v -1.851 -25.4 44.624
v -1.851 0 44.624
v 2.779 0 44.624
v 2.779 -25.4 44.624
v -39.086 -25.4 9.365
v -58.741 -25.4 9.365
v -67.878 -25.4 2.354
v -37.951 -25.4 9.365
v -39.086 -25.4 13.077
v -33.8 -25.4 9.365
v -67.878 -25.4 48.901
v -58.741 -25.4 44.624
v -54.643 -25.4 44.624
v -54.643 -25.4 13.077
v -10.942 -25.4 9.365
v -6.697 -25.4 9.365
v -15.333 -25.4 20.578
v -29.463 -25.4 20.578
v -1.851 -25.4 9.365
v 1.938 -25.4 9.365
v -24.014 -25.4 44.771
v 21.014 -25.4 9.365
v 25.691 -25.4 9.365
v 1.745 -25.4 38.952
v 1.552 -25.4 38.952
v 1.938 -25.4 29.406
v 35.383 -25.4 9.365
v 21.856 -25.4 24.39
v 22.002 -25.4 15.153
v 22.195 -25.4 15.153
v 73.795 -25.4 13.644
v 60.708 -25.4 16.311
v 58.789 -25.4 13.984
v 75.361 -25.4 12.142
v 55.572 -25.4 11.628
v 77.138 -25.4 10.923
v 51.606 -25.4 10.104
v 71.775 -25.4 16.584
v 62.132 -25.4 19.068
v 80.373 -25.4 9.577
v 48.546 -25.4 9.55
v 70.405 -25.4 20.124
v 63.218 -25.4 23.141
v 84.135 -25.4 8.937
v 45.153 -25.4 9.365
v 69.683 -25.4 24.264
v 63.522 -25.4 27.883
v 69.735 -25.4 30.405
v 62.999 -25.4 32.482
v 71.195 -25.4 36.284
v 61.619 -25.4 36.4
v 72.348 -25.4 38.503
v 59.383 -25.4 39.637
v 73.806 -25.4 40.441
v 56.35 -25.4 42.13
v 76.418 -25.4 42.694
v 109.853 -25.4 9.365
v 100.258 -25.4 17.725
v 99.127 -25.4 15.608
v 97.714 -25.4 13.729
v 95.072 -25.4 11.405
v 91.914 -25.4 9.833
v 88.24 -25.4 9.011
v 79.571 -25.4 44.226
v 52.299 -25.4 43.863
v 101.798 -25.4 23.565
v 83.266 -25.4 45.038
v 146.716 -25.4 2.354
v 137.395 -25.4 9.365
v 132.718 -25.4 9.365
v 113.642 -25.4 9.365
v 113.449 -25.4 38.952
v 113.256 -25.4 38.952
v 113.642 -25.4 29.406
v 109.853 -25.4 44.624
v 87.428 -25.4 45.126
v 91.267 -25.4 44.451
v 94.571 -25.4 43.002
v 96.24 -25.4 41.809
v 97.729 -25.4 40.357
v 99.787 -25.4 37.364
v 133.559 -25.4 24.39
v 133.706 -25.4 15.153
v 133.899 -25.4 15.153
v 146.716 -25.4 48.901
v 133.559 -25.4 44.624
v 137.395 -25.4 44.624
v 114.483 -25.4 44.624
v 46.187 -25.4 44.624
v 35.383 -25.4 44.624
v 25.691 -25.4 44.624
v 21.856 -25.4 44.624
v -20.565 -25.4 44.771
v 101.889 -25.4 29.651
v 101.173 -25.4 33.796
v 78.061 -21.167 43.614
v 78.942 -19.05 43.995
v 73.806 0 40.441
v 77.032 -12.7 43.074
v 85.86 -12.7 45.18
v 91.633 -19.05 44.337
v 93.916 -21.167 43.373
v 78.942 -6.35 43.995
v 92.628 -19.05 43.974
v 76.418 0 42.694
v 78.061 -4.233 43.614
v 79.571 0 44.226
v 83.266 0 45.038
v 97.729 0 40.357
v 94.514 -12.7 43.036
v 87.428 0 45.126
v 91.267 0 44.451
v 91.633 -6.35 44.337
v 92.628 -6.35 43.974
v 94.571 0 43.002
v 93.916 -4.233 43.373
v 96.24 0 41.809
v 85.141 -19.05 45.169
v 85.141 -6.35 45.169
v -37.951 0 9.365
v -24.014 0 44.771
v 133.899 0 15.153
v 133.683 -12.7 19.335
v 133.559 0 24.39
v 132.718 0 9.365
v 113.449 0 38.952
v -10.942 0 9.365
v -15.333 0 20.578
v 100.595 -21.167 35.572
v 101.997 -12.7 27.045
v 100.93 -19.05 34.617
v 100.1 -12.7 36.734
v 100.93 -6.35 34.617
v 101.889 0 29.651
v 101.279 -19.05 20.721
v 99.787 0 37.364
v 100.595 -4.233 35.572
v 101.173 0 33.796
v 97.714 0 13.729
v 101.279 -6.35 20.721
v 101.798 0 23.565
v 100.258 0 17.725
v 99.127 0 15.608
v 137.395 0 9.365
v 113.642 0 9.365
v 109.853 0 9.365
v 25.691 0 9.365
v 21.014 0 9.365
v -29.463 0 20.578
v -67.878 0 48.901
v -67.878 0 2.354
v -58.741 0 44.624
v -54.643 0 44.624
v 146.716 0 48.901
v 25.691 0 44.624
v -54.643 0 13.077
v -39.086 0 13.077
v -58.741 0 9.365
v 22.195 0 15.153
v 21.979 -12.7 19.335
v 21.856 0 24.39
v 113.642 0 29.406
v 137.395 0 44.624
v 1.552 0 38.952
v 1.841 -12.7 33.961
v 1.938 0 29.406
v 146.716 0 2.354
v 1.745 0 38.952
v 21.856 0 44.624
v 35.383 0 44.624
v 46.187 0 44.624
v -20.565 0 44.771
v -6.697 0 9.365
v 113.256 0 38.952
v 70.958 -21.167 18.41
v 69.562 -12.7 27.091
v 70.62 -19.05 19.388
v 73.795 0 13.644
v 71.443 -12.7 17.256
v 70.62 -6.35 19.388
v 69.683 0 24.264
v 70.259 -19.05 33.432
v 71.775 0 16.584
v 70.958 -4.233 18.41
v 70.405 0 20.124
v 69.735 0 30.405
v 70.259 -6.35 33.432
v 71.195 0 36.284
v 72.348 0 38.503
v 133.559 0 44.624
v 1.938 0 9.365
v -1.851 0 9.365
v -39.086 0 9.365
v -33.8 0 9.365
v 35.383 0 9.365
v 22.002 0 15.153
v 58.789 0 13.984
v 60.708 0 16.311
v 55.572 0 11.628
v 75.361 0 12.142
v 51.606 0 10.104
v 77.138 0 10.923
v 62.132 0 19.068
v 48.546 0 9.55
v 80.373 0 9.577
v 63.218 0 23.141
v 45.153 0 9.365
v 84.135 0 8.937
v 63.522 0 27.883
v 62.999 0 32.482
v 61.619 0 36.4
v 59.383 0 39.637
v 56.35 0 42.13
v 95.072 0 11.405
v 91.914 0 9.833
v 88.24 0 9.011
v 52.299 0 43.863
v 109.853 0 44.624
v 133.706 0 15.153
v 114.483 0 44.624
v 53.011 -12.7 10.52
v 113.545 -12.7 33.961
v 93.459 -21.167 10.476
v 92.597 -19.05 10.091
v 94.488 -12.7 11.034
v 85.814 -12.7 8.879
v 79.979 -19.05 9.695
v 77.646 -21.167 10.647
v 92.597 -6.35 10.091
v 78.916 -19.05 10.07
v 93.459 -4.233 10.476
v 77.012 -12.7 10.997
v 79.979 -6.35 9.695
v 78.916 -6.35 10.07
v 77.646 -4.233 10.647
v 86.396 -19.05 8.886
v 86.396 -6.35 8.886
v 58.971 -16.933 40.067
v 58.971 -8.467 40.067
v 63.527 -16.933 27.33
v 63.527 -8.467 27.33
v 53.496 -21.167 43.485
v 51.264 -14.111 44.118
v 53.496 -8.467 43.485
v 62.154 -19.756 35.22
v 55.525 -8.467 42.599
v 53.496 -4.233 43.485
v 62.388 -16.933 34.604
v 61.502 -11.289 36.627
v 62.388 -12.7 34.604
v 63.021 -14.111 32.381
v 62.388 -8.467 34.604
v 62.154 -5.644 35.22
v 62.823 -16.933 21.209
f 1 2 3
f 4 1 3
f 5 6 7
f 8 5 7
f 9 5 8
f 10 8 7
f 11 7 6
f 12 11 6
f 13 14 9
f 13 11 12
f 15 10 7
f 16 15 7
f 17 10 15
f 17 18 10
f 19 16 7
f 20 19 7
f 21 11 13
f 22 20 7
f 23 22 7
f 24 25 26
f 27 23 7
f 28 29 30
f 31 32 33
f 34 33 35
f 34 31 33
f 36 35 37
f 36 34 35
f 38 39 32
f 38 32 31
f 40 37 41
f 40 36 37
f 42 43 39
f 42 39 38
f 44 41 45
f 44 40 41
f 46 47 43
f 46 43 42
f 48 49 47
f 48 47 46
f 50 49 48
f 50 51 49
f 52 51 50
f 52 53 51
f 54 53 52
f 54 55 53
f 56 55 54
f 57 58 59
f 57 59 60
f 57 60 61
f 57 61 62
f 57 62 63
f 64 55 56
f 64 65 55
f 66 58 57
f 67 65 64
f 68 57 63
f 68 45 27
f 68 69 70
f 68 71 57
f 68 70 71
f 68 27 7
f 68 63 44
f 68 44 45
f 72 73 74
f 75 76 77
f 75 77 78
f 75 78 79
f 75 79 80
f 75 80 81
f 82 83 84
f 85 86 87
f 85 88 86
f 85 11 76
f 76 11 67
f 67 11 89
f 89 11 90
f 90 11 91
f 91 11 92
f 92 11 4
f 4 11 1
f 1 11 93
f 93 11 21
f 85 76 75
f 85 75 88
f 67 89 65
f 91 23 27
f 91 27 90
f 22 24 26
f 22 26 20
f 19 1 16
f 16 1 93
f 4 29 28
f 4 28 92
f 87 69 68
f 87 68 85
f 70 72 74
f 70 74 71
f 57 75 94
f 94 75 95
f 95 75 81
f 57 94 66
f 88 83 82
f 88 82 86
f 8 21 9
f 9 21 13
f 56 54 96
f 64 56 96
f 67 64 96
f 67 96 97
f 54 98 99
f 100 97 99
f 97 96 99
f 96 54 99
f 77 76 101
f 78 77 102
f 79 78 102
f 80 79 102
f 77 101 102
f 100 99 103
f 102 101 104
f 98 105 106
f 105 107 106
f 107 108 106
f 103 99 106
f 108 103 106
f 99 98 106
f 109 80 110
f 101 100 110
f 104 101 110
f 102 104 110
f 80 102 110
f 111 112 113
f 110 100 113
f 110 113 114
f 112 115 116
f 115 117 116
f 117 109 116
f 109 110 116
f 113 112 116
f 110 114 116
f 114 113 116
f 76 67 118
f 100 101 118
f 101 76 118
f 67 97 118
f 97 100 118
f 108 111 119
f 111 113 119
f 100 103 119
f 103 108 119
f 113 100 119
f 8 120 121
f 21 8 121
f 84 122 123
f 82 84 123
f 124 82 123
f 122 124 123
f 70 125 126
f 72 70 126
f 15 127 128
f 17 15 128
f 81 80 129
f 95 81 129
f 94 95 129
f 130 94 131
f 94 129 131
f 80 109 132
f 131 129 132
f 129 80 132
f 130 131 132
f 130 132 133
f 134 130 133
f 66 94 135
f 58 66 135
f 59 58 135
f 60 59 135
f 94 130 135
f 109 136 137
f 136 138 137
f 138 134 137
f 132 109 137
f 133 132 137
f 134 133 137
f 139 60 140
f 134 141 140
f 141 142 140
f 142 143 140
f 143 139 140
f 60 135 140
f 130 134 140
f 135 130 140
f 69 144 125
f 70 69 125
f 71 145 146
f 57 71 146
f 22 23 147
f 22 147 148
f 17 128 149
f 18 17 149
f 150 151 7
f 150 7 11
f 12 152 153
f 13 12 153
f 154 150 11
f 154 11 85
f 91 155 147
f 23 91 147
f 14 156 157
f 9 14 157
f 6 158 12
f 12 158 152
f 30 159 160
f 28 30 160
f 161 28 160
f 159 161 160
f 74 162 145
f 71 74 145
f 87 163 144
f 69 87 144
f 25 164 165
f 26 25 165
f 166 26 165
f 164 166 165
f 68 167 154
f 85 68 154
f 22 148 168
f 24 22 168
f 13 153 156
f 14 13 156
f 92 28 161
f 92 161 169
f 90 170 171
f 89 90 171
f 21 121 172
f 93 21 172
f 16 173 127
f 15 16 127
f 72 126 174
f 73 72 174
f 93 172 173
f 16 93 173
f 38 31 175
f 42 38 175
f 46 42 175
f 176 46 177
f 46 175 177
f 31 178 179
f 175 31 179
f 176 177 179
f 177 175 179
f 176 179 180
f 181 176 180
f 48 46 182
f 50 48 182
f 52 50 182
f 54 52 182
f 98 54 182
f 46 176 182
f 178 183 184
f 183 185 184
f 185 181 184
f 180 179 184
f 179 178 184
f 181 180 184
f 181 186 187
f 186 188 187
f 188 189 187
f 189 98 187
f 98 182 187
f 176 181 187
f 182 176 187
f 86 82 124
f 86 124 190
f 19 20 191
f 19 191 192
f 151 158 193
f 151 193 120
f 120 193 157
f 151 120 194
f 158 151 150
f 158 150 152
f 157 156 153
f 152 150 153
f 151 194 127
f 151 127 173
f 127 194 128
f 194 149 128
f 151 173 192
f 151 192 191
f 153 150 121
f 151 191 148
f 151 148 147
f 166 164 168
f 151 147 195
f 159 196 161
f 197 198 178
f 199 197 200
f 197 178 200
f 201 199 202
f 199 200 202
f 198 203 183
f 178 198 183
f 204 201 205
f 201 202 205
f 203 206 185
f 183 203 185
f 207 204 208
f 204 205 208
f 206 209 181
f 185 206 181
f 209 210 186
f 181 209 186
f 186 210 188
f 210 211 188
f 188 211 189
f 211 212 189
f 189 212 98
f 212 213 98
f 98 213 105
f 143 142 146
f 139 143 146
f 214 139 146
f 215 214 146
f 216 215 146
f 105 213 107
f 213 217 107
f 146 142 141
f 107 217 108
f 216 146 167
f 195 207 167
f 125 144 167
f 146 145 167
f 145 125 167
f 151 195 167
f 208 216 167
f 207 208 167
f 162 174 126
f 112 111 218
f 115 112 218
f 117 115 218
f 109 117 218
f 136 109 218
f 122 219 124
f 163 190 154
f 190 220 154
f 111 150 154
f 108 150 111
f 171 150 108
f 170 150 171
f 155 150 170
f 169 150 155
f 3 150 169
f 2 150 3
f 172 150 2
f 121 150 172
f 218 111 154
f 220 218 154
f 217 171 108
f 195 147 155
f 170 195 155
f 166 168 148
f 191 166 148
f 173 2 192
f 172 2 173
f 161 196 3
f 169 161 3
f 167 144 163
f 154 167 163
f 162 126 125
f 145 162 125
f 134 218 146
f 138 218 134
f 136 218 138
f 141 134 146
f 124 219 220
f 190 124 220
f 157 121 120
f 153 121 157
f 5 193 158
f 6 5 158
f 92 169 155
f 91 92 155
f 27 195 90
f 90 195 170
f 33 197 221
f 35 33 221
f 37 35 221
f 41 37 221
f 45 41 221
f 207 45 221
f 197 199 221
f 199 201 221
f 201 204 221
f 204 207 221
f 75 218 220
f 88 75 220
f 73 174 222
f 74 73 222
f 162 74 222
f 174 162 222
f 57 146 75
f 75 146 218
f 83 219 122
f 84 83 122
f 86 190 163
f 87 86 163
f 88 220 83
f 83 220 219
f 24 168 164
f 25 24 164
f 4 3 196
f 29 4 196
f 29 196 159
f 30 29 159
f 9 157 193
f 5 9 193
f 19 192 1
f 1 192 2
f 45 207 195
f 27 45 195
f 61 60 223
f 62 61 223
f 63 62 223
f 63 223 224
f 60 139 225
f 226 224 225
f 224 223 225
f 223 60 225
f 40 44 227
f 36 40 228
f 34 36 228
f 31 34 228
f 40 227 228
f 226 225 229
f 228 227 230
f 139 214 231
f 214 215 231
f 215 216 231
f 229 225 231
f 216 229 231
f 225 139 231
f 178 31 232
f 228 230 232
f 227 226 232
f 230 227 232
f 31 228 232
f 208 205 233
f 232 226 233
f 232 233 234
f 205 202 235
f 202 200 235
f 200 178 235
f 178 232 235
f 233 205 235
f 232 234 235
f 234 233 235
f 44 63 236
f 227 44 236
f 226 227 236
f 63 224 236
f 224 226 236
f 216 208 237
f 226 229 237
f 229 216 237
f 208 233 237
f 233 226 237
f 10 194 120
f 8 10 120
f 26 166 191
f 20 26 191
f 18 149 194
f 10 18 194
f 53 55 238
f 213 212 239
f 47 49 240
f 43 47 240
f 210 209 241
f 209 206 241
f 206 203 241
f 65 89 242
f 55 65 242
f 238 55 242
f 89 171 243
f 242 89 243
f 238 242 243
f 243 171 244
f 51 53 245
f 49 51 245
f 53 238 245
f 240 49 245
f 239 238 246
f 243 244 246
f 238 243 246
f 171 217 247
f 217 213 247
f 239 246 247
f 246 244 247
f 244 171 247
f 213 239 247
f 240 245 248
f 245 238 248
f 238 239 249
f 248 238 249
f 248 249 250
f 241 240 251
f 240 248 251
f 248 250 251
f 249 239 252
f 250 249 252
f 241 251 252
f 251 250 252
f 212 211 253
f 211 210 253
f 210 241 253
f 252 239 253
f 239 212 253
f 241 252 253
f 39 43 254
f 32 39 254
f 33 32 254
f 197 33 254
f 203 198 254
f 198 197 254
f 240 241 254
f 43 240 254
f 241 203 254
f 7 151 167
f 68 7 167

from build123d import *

# Parameters (mm, degrees)
F0_W     = 214.5938575268
F0_H     = 46.5465178713
F1_DEPTH = 25.4


with BuildPart() as f1:
    # F0 (on Front) → F1 (new body)
    with BuildSketch(Plane.XZ):
        with Locations((39.4191890955, 25.6276843138)):
            Rectangle(F0_W, F0_H)
        Polygon((-39.0857293959, 9.3650380149), (-58.7409636363, 9.3650380149), (-58.7409636363, 44.6240742319), (-54.6432292894, 44.6240742319), (-54.6432292894, 13.0769216701), (-39.0857293959, 13.0769216701), align=None, mode=Mode.SUBTRACT)
        Polygon((-6.697422326, 9.3650380149), (-10.9417799358, 9.3650380149), (-15.3327608085, 20.5778591187), (-29.4626131423, 20.5778591187), (-33.7995749182, 9.3650380149), (-37.951328362, 9.3650380149), (-24.0144013741, 44.7706974947), (-20.5648961894, 44.7706974947), align=None, mode=Mode.SUBTRACT)
        with BuildLine():
            Line((25.6908847439, 44.6240742319), (25.6908847439, 9.3650380149))
            Line((25.6908847439, 9.3650380149), (21.0143743593, 9.3650380149))
            Line((21.0143743593, 9.3650380149), (1.7449908106, 38.9520690624))
            Line((1.7449908106, 38.9520690624), (1.5520654647, 38.9520690624))
            add(Edge.make_bspline(
                [(1.5520654647, 38.9520690624), (1.9379161565, 33.743084723), (1.9379161565, 29.4061229472)],
                knots=[0, 0, 0, 1, 1, 1], degree=2))
            Line((1.9379161565, 29.4061229472), (1.9379161565, 9.3650380149))
            Line((1.9379161565, 9.3650380149), (-1.851137637, 9.3650380149))
            Line((-1.851137637, 9.3650380149), (-1.851137637, 44.6240742319))
            Line((-1.851137637, 44.6240742319), (2.7790706647, 44.6240742319))
            Line((2.7790706647, 44.6240742319), (22.0021521303, 15.152798392))
            Line((22.0021521303, 15.152798392), (22.1950774762, 15.152798392))
            add(Edge.make_bspline(
                [(22.1950774762, 15.152798392), (22.1487753932, 15.8010275542), (21.9790010888, 19.3354198911)],
                knots=[0, 0, 0, 1, 1, 1], degree=2))
            add(Edge.make_bspline(
                [(21.9790010888, 19.3354198911), (21.8092267844, 22.869812228), (21.8555288674, 24.3900639537)],
                knots=[0, 0, 0, 1, 1, 1], degree=2))
            Line((21.8555288674, 24.3900639537), (21.8555288674, 44.6240742319))
            Line((21.8555288674, 44.6240742319), (25.6908847439, 44.6240742319))
        make_face(mode=Mode.SUBTRACT)
        with BuildLine():
            add(Edge.make_bspline(
                [(58.9705069119, 40.0671775617), (63.5274035821, 35.5102808915), (63.5274035821, 27.3302462253)],
                knots=[0, 0, 0, 1, 1, 1], degree=2))
            add(Edge.make_bspline(
                [(63.5274035821, 27.3302462253), (63.5274035821, 18.6023035767), (58.7891570867, 13.9836707958)],
                knots=[0, 0, 0, 1, 1, 1], degree=2))
            add(Edge.make_bspline(
                [(58.7891570867, 13.9836707958), (54.0509105914, 9.3650380149), (45.1531936384, 9.3650380149)],
                knots=[0, 0, 0, 1, 1, 1], degree=2))
            Line((45.1531936384, 9.3650380149), (35.383454122, 9.3650380149))
            Line((35.383454122, 9.3650380149), (35.383454122, 44.6240742319))
            Line((35.383454122, 44.6240742319), (46.1872734925, 44.6240742319))
            add(Edge.make_bspline(
                [(46.1872734925, 44.6240742319), (54.4136102417, 44.6240742319), (58.9705069119, 40.0671775617)],
                knots=[0, 0, 0, 1, 1, 1], degree=2))
        make_face(mode=Mode.SUBTRACT)
        with BuildLine():
            add(Edge.make_bspline(
                [(97.7292089034, 40.3565655805), (101.9967175548, 35.533431933), (101.9967175548, 27.0447167133)],
                knots=[0, 0, 0, 1, 1, 1], degree=2))
            add(Edge.make_bspline(
                [(101.9967175548, 27.0447167133), (101.9967175548, 18.5791525352), (97.7137748758, 13.7290093392)],
                knots=[0, 0, 0, 1, 1, 1], degree=2))
            add(Edge.make_bspline(
                [(97.7137748758, 13.7290093392), (93.4308321967, 8.8788661433), (85.8141395406, 8.8788661433)],
                knots=[0, 0, 0, 1, 1, 1], degree=2))
            add(Edge.make_bspline(
                [(85.8141395406, 8.8788661433), (78.02767258, 8.8788661433), (73.7948904909, 13.644122187)],
                knots=[0, 0, 0, 1, 1, 1], degree=2))
            add(Edge.make_bspline(
                [(73.7948904909, 13.644122187), (69.5621084018, 18.4093782308), (69.5621084018, 27.0910187964)],
                knots=[0, 0, 0, 1, 1, 1], degree=2))
            add(Edge.make_bspline(
                [(69.5621084018, 27.0910187964), (69.5621084018, 35.7032062374), (73.8064660117, 40.4414527327)],
                knots=[0, 0, 0, 1, 1, 1], degree=2))
            add(Edge.make_bspline(
                [(73.8064660117, 40.4414527327), (78.0508236215, 45.1796992281), (85.8604416236, 45.1796992281)],
                knots=[0, 0, 0, 1, 1, 1], degree=2))
            add(Edge.make_bspline(
                [(85.8604416236, 45.1796992281), (93.4617002521, 45.1796992281), (97.7292089034, 40.3565655805)],
                knots=[0, 0, 0, 1, 1, 1], degree=2))
        make_face(mode=Mode.SUBTRACT)
        with BuildLine():
            Line((137.3946600207, 44.6240742319), (137.3946600207, 9.3650380149))
            Line((137.3946600207, 9.3650380149), (132.7181496361, 9.3650380149))
            Line((132.7181496361, 9.3650380149), (113.4487660875, 38.9520690624))
            Line((113.4487660875, 38.9520690624), (113.2558407416, 38.9520690624))
            add(Edge.make_bspline(
                [(113.2558407416, 38.9520690624), (113.6416914334, 33.743084723), (113.6416914334, 29.4061229472)],
                knots=[0, 0, 0, 1, 1, 1], degree=2))
            Line((113.6416914334, 29.4061229472), (113.6416914334, 9.3650380149))
            Line((113.6416914334, 9.3650380149), (109.8526376399, 9.3650380149))
            Line((109.8526376399, 9.3650380149), (109.8526376399, 44.6240742319))
            Line((109.8526376399, 44.6240742319), (114.4828459415, 44.6240742319))
            Line((114.4828459415, 44.6240742319), (133.7059274071, 15.152798392))
            Line((133.7059274071, 15.152798392), (133.898852753, 15.152798392))
            add(Edge.make_bspline(
                [(133.898852753, 15.152798392), (133.85255067, 15.8010275542), (133.6827763656, 19.3354198911)],
                knots=[0, 0, 0, 1, 1, 1], degree=2))
            add(Edge.make_bspline(
                [(133.6827763656, 19.3354198911), (133.5130020612, 22.869812228), (133.5593041442, 24.3900639537)],
                knots=[0, 0, 0, 1, 1, 1], degree=2))
            Line((133.5593041442, 24.3900639537), (133.5593041442, 44.6240742319))
            Line((133.5593041442, 44.6240742319), (137.3946600207, 44.6240742319))
        make_face(mode=Mode.SUBTRACT)
    extrude(amount=F1_DEPTH)


solid = f1.part
